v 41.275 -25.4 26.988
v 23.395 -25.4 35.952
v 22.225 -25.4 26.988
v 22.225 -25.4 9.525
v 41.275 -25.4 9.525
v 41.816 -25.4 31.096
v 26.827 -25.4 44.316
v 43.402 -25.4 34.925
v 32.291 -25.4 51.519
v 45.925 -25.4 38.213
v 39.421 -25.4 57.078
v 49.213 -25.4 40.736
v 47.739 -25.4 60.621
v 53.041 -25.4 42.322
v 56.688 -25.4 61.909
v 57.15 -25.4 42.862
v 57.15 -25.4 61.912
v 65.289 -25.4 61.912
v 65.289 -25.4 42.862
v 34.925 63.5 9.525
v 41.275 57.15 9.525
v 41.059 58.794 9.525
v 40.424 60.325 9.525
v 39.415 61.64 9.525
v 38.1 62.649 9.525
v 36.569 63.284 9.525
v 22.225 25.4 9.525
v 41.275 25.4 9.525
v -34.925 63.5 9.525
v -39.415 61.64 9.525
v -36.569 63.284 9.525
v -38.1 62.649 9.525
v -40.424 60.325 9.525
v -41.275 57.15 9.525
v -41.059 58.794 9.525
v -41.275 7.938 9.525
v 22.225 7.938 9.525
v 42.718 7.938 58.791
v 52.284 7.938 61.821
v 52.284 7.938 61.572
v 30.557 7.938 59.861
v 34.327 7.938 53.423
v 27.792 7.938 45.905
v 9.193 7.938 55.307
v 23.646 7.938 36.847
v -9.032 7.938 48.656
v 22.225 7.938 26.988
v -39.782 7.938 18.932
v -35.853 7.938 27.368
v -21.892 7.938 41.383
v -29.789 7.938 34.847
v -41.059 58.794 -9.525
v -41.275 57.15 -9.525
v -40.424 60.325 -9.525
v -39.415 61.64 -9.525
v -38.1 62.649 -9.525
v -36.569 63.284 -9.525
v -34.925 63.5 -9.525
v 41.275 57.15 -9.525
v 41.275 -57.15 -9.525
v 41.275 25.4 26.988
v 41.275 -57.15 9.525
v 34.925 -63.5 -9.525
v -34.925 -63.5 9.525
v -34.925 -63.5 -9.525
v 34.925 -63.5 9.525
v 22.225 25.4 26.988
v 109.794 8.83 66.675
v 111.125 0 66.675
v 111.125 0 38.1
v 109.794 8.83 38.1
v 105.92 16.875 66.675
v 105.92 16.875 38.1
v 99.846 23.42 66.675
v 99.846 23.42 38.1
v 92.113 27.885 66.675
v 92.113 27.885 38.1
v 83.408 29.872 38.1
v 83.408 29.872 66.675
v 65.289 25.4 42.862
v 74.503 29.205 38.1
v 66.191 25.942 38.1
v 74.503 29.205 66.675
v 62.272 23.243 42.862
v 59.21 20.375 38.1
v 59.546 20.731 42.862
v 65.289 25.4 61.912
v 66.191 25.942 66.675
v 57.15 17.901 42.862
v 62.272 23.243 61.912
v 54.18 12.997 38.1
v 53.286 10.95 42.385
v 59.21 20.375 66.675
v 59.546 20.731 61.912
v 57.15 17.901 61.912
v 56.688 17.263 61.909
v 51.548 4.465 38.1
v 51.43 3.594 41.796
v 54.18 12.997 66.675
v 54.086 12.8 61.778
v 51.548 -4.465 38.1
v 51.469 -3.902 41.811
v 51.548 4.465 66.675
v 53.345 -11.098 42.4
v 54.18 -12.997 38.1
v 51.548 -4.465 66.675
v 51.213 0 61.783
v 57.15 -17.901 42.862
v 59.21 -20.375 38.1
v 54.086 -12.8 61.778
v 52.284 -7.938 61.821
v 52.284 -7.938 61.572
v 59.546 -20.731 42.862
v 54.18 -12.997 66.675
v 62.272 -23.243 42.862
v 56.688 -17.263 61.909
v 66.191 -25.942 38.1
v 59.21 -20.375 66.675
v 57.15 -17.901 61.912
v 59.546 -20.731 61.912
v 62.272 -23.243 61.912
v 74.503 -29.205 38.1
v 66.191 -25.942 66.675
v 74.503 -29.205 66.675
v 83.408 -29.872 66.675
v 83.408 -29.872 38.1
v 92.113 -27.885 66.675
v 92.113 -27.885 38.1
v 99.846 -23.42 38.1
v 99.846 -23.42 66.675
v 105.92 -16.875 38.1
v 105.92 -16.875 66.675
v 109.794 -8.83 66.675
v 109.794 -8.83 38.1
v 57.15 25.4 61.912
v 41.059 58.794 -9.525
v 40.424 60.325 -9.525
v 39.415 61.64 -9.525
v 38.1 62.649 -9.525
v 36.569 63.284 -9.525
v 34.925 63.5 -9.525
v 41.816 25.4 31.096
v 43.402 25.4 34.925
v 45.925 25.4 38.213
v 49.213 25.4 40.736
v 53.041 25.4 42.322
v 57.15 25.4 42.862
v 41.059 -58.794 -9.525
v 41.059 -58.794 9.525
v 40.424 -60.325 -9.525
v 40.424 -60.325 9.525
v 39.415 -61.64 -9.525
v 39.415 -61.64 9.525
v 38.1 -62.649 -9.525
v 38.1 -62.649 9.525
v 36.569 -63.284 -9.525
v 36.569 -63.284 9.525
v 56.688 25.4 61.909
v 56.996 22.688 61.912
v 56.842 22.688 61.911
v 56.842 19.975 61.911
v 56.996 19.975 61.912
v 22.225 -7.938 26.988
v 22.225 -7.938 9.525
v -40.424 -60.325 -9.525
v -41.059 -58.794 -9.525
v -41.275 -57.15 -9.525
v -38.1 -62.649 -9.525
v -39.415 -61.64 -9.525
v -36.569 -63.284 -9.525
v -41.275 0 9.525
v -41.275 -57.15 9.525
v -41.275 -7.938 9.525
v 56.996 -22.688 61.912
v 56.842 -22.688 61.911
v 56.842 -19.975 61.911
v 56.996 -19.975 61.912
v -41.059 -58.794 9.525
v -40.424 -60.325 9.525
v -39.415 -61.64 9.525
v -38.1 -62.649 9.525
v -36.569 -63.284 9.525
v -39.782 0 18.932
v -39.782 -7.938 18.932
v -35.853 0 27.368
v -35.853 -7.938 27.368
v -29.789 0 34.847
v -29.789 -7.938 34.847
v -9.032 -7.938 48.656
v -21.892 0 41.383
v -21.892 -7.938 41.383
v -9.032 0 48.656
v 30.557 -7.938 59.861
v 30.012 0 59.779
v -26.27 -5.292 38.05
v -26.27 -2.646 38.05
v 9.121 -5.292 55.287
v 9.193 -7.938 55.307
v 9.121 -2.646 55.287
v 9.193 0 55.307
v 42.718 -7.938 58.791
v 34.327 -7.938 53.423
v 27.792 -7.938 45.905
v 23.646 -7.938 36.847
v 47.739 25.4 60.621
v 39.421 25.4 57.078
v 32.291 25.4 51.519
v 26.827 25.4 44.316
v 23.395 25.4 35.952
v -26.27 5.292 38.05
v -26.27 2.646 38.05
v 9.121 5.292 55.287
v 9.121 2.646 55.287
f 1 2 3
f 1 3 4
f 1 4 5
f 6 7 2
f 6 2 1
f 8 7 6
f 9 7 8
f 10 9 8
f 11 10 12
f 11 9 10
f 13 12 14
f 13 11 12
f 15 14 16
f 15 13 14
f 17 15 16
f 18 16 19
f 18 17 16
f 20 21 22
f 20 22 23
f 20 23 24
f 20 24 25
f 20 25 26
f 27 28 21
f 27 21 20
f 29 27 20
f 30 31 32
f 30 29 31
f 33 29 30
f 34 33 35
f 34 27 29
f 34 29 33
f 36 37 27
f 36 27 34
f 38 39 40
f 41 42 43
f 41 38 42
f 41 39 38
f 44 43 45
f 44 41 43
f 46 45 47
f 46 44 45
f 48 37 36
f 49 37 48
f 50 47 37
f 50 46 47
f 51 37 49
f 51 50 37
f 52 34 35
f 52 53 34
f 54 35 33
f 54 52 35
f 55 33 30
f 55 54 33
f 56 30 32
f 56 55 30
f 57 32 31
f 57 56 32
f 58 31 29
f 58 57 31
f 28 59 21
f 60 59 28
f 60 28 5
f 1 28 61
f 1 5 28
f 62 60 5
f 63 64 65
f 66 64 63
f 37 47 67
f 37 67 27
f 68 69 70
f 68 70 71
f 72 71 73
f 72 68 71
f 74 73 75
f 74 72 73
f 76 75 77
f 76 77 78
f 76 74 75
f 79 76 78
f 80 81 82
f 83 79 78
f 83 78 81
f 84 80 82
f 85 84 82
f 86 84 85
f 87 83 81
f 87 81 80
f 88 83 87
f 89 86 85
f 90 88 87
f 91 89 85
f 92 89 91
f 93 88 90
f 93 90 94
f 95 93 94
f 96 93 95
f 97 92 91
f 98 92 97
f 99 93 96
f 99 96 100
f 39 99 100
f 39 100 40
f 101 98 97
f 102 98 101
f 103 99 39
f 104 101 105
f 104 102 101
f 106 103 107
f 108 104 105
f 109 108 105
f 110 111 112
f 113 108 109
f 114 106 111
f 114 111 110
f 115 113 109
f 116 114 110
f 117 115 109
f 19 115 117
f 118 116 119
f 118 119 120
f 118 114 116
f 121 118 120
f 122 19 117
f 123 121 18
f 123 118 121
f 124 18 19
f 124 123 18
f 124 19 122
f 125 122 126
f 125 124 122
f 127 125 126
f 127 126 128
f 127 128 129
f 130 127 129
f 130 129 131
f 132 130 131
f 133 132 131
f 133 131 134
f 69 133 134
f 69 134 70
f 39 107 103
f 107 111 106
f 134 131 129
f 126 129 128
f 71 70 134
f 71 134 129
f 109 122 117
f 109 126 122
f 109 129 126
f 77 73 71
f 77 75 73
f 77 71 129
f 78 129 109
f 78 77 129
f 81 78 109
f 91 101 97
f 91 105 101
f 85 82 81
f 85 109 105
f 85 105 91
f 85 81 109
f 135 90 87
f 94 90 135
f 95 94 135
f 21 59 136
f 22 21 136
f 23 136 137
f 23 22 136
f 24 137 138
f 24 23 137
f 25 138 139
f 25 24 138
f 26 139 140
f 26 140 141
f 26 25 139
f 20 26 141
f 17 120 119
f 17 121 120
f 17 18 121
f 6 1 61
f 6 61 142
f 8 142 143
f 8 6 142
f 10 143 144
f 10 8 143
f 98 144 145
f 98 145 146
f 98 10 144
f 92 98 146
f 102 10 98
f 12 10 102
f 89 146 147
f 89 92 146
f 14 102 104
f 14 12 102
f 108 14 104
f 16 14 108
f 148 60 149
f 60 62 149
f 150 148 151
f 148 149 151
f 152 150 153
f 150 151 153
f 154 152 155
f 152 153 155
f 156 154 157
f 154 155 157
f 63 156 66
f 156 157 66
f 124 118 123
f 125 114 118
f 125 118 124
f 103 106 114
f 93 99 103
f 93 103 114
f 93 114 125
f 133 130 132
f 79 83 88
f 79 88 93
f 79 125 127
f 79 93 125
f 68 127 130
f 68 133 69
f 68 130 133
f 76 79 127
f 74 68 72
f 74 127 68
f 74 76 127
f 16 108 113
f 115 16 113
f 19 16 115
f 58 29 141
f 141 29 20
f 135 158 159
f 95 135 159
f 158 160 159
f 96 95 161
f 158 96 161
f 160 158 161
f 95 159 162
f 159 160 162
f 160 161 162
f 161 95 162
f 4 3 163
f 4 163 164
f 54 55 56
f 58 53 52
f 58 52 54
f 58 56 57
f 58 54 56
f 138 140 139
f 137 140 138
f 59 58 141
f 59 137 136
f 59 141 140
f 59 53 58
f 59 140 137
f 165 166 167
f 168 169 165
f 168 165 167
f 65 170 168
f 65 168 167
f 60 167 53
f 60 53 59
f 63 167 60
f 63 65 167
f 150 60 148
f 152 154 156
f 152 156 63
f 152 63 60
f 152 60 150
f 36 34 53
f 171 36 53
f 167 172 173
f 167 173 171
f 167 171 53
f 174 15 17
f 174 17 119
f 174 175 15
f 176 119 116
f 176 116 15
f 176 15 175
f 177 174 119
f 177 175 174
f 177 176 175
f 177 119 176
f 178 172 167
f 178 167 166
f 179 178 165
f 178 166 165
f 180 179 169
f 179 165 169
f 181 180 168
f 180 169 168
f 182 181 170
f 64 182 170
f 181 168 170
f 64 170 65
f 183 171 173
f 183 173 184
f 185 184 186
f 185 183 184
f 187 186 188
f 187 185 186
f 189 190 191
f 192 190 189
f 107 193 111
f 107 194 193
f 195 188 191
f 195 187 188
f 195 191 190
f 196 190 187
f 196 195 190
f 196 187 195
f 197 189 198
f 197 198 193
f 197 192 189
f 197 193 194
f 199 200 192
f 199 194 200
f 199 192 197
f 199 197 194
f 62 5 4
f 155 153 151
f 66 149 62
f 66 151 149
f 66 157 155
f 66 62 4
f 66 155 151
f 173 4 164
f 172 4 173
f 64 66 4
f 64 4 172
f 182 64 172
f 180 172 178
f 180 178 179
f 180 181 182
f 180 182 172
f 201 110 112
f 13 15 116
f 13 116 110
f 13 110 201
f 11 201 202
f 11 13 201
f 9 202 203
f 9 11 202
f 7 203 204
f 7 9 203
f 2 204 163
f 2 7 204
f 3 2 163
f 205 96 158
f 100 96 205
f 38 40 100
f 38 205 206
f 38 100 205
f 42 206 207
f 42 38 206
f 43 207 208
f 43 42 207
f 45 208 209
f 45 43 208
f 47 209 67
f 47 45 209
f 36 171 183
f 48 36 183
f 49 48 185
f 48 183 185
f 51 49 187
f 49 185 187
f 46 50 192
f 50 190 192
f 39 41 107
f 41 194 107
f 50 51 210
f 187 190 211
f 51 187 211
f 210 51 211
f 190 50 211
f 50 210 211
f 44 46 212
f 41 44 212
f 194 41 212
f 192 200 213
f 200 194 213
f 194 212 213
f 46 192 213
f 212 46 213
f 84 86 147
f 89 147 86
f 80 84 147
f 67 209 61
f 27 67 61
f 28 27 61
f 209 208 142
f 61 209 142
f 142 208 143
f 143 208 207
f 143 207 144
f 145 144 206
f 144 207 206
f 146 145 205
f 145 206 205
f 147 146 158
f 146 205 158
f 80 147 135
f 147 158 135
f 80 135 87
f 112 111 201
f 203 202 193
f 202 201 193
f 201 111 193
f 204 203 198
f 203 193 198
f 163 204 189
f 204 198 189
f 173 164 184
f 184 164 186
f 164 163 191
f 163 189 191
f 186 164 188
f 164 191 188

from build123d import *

# Parameters (mm, degrees)
F1_DEPTH = 63.5
F2_DEPTH = 25.4
F3_DEPTH = 7.9375
F4_DEPTH = 25.4
F6_R     = 6.35


# Not quite as in the source:
# - a feature names something its author has since deleted; it is built from what else it names


with BuildPart() as f1:
    # F0 (on Front) → F1 (new body, symmetric)
    with BuildSketch(Plane.XZ):
        Polygon((-41.275, 9.525), (-41.275, -9.525), (41.275, -9.525), (41.275, 9.525), (22.225, 9.525), align=None)
    extrude(amount=F1_DEPTH, both=True)

    # F0 (on Front) → F2 (join, symmetric)
    with BuildSketch(Plane.XZ):
        with BuildLine():
            Line((22.225, 9.525), (41.275, 9.525))
            Line((41.275, 9.525), (41.275, 26.9875))
            ThreePointArc((41.275, 26.9875), (45.9246798487, 38.2128201513), (57.15, 42.8625))
            Line((57.15, 42.8625), (60.325, 42.8625))
            Line((60.325, 42.8625), (60.325, 61.9125))
            Line((60.325, 61.9125), (57.15, 61.9125))
            add(Edge.make_bspline(
                [(56.6876973993, 61.9094401137), (56.8419218796, 61.9106607794), (56.996023665, 61.9116806988), (57.15, 61.9125)],
                knots=[111.1067595469, 111.1067595469, 111.1067595469, 111.1067595469, 111.4985685166, 111.4985685166, 111.4985685166, 111.4985685166], degree=3))
            ThreePointArc((56.6876973993, 61.9094401137), (32.2913843574, 51.5192111783), (22.225, 26.9875))
            Line((22.225, 26.9875), (22.225, 9.525))
        make_face()
    extrude(amount=F2_DEPTH, both=True)

    # F0 (on Front) → F3 (join, symmetric)
    with BuildSketch(Plane.XZ):
        with BuildLine():
            add(Edge.make_bspline(
                [(-41.275, 9.525), (-40.6467419825, 45.0743155721), (12.9536750235, 61.5632913076), (56.6876973993, 61.9094401137)],
                knots=[0, 0, 0, 0, 111.1067595469, 111.1067595469, 111.1067595469, 111.1067595469], degree=3))
            Line((-41.275, 9.525), (22.225, 9.525))
            Line((22.225, 9.525), (22.225, 26.9875))
            ThreePointArc((22.225, 26.9875), (32.2913843574, 51.5192111783), (56.6876973993, 61.9094401137))
        make_face()
    extrude(amount=F3_DEPTH, both=True)

    # F0 (on Front) → F4 (join, symmetric)
    with BuildSketch(Plane.XZ):
        Polygon((81.1691840627, 61.9125), (60.325, 61.9125), (60.325, 42.8625), (81.1691840627, 42.8625), (81.1691840627, 52.7276583016), align=None)
    extrude(amount=F4_DEPTH, both=True)

    # F0 (on Front) → F5 (revolve)
    with BuildSketch(Plane.XZ):
        Polygon((81.1691840627, 66.675), (81.1691840627, 61.9125), (81.1691840627, 52.7276583016), (81.1691840627, 42.8625), (81.1691840627, 38.1), (111.125, 38.1), (111.125, 66.675), align=None)
    revolve(axis=Axis((81.1691840627, 0, 57.3200791508), (0, 0, 1)))

    # F6
    f6_edges = [f1.edges().sort_by_distance(p)[0] for p in [
        (-41.275, -63.5, 0),
        (41.275, -63.5, 0),
        (41.275, 63.5, 0),
        (-41.275, 63.5, 0),
    ]]
    fillet(f6_edges, radius=F6_R)


solid = f1.part
